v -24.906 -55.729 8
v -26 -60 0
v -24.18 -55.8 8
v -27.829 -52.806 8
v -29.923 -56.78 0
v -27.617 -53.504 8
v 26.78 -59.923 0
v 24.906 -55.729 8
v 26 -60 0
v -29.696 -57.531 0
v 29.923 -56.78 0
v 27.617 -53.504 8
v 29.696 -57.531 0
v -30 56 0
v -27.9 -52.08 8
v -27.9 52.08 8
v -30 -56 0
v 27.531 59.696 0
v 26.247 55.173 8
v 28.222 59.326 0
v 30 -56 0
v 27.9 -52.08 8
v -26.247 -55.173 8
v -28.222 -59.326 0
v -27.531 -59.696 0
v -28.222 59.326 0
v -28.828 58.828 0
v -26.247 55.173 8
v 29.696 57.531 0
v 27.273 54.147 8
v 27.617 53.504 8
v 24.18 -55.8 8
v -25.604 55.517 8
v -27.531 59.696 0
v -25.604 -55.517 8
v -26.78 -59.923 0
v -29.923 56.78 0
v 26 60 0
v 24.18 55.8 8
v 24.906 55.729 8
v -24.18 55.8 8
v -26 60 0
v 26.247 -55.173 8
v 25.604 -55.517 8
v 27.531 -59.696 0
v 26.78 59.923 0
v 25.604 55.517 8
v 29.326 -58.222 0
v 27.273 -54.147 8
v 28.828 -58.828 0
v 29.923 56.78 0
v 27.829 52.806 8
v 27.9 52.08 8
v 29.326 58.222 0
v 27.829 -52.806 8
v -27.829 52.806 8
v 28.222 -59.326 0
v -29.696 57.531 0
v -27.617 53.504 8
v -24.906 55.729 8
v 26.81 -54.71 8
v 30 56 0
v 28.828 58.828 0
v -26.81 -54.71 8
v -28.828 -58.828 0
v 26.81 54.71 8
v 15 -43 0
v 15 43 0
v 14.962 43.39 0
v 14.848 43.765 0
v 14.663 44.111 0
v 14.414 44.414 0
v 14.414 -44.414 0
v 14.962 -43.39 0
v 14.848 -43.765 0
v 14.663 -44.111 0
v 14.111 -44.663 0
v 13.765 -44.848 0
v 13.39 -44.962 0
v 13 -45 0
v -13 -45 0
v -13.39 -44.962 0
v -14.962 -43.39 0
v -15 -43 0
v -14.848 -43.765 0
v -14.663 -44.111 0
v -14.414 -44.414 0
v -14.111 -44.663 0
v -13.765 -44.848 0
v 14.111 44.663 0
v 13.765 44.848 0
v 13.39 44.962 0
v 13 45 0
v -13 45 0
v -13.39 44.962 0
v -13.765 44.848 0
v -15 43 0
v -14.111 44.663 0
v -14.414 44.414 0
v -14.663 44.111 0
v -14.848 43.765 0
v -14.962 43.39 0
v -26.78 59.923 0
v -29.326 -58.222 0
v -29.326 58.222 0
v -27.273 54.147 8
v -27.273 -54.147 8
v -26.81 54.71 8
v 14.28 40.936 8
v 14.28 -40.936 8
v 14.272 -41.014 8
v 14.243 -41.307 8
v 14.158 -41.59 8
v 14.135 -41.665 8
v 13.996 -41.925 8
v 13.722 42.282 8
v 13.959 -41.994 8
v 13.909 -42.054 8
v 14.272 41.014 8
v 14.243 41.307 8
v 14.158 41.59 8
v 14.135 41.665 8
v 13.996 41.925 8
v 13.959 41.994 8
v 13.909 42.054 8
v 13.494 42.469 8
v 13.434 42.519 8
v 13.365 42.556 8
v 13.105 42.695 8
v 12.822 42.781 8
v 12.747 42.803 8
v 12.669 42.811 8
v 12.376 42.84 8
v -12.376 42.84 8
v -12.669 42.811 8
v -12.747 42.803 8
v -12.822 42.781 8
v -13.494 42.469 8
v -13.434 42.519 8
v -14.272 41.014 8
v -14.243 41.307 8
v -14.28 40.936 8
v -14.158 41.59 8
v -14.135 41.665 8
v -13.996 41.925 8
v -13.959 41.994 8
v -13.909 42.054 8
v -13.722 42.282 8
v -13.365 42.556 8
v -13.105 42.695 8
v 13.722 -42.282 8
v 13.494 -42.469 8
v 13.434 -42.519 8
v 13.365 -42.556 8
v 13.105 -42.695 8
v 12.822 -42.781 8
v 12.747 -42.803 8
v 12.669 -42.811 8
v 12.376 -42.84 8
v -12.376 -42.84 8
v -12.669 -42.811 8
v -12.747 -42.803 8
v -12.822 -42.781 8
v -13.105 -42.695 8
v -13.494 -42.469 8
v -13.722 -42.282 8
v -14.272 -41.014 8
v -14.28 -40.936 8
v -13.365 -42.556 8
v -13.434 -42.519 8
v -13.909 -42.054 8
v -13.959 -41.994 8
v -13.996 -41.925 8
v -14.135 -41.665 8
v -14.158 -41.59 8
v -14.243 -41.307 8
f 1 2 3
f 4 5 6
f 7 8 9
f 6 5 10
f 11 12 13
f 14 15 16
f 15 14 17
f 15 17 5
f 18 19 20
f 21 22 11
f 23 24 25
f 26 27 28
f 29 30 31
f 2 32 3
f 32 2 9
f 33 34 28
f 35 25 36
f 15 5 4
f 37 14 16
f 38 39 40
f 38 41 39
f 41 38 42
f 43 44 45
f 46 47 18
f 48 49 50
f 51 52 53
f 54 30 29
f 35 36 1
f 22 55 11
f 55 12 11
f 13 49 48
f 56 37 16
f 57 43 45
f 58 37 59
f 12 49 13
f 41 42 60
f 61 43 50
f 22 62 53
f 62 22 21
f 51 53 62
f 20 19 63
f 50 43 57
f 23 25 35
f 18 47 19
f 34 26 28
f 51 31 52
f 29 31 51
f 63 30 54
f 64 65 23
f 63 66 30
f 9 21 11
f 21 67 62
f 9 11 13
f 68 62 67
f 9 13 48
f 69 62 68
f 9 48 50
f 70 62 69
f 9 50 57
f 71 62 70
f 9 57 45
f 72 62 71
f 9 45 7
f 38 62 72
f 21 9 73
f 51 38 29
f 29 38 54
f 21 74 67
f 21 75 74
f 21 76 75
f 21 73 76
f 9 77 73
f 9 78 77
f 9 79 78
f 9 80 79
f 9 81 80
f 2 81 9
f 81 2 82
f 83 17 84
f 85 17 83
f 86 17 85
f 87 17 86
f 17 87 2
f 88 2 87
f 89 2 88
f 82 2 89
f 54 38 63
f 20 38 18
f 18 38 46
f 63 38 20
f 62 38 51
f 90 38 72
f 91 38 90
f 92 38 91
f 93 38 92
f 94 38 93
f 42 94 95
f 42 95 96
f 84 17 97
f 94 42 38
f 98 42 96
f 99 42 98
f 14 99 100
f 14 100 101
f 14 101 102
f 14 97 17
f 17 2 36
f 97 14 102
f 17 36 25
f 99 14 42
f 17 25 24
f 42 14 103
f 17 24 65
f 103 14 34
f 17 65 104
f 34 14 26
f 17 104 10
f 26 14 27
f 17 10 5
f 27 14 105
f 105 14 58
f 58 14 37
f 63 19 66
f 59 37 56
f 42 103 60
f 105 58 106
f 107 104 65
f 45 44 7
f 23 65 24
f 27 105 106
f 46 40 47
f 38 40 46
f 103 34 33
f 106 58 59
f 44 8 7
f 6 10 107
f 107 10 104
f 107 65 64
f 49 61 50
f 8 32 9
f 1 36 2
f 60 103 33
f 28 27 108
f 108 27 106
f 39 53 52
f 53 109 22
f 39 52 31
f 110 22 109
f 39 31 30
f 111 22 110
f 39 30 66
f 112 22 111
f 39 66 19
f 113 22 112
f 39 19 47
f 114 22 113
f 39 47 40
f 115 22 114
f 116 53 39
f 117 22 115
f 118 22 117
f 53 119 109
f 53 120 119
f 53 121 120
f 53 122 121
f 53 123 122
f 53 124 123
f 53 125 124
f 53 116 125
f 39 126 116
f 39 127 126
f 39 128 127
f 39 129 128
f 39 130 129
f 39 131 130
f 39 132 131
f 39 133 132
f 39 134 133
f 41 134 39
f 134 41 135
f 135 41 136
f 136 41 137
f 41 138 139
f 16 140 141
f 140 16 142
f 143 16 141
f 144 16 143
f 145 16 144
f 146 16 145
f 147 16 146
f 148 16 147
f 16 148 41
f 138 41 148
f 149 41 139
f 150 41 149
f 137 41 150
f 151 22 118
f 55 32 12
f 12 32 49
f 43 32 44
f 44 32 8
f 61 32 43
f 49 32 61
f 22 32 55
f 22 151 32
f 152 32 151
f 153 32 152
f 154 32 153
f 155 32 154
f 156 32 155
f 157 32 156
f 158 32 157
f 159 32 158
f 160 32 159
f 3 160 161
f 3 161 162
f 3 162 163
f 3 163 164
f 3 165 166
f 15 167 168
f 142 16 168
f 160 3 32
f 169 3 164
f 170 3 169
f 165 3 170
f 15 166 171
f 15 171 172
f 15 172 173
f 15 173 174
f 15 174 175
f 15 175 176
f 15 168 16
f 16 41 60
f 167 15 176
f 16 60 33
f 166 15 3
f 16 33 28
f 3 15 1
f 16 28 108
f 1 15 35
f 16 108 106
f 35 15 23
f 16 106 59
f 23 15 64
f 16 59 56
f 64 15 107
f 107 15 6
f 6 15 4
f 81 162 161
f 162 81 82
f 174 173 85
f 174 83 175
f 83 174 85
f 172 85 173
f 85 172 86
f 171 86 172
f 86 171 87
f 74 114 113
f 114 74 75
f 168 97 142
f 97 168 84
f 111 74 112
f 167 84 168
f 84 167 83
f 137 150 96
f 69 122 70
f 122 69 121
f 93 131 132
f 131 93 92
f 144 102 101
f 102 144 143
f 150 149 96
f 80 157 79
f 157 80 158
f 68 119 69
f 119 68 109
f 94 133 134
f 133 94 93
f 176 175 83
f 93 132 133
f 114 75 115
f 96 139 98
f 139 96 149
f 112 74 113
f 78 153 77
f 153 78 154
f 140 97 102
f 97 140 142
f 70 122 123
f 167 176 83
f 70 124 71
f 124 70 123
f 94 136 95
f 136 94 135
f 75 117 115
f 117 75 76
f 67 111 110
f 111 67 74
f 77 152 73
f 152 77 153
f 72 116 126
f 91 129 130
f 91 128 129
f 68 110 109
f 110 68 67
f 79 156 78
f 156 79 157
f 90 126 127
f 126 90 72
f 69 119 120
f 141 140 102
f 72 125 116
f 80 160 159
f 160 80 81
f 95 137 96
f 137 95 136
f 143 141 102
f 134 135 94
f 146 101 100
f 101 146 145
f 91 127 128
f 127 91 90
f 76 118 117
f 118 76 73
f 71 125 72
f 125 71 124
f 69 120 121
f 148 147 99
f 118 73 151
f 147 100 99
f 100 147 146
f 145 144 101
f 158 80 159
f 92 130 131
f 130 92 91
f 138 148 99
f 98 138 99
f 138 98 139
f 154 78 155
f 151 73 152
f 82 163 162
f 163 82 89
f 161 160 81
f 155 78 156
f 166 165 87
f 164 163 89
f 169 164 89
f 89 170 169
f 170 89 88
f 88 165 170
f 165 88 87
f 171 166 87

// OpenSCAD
$fn = 32;

// ----------------------------------------------------------------------
// Display bezel: 60 x 120 mm frame, opening 30x90 mm
// ----------------------------------------------------------------------

// --- parameters (mm) ---
length = 60;              // frame outside length, X
width = 120;              // frame outside width, Y
frame_w = 15;             // frame width
thickness = 8;            // frame thickness
corner_r = 4;             // outside corner radius
chamfer = 0.93;           // outer wall taper
funnel = 0.94;            // inner opening taper
opening_l = 30;           // opening length
opening_w = 90;           // opening width
inner_r = 2;              // opening corner radius

/* rounded-rectangle outlines, generated with loops */
module rounded_ring(l_nom, w_nom, r) {
  hull() {
    for (sx = [-1, 1]) for (sy = [-1, 1])
      translate([sx * (l_nom / 2 - r), sy * (w_nom / 2 - r)]) circle(r = r);
  }
}

difference() {
  /* frame body, drafted so the outer edge is a variable-depth chamfer */
  linear_extrude(height = thickness, scale = chamfer)
    rounded_ring(length, width, corner_r);
  /* viewing opening, drafted the other way for a funnel edge */
  linear_extrude(height = thickness + 2, scale = funnel)
    translate([0, 0, -1]) rounded_ring(opening_l, opening_w, inner_r);
}
